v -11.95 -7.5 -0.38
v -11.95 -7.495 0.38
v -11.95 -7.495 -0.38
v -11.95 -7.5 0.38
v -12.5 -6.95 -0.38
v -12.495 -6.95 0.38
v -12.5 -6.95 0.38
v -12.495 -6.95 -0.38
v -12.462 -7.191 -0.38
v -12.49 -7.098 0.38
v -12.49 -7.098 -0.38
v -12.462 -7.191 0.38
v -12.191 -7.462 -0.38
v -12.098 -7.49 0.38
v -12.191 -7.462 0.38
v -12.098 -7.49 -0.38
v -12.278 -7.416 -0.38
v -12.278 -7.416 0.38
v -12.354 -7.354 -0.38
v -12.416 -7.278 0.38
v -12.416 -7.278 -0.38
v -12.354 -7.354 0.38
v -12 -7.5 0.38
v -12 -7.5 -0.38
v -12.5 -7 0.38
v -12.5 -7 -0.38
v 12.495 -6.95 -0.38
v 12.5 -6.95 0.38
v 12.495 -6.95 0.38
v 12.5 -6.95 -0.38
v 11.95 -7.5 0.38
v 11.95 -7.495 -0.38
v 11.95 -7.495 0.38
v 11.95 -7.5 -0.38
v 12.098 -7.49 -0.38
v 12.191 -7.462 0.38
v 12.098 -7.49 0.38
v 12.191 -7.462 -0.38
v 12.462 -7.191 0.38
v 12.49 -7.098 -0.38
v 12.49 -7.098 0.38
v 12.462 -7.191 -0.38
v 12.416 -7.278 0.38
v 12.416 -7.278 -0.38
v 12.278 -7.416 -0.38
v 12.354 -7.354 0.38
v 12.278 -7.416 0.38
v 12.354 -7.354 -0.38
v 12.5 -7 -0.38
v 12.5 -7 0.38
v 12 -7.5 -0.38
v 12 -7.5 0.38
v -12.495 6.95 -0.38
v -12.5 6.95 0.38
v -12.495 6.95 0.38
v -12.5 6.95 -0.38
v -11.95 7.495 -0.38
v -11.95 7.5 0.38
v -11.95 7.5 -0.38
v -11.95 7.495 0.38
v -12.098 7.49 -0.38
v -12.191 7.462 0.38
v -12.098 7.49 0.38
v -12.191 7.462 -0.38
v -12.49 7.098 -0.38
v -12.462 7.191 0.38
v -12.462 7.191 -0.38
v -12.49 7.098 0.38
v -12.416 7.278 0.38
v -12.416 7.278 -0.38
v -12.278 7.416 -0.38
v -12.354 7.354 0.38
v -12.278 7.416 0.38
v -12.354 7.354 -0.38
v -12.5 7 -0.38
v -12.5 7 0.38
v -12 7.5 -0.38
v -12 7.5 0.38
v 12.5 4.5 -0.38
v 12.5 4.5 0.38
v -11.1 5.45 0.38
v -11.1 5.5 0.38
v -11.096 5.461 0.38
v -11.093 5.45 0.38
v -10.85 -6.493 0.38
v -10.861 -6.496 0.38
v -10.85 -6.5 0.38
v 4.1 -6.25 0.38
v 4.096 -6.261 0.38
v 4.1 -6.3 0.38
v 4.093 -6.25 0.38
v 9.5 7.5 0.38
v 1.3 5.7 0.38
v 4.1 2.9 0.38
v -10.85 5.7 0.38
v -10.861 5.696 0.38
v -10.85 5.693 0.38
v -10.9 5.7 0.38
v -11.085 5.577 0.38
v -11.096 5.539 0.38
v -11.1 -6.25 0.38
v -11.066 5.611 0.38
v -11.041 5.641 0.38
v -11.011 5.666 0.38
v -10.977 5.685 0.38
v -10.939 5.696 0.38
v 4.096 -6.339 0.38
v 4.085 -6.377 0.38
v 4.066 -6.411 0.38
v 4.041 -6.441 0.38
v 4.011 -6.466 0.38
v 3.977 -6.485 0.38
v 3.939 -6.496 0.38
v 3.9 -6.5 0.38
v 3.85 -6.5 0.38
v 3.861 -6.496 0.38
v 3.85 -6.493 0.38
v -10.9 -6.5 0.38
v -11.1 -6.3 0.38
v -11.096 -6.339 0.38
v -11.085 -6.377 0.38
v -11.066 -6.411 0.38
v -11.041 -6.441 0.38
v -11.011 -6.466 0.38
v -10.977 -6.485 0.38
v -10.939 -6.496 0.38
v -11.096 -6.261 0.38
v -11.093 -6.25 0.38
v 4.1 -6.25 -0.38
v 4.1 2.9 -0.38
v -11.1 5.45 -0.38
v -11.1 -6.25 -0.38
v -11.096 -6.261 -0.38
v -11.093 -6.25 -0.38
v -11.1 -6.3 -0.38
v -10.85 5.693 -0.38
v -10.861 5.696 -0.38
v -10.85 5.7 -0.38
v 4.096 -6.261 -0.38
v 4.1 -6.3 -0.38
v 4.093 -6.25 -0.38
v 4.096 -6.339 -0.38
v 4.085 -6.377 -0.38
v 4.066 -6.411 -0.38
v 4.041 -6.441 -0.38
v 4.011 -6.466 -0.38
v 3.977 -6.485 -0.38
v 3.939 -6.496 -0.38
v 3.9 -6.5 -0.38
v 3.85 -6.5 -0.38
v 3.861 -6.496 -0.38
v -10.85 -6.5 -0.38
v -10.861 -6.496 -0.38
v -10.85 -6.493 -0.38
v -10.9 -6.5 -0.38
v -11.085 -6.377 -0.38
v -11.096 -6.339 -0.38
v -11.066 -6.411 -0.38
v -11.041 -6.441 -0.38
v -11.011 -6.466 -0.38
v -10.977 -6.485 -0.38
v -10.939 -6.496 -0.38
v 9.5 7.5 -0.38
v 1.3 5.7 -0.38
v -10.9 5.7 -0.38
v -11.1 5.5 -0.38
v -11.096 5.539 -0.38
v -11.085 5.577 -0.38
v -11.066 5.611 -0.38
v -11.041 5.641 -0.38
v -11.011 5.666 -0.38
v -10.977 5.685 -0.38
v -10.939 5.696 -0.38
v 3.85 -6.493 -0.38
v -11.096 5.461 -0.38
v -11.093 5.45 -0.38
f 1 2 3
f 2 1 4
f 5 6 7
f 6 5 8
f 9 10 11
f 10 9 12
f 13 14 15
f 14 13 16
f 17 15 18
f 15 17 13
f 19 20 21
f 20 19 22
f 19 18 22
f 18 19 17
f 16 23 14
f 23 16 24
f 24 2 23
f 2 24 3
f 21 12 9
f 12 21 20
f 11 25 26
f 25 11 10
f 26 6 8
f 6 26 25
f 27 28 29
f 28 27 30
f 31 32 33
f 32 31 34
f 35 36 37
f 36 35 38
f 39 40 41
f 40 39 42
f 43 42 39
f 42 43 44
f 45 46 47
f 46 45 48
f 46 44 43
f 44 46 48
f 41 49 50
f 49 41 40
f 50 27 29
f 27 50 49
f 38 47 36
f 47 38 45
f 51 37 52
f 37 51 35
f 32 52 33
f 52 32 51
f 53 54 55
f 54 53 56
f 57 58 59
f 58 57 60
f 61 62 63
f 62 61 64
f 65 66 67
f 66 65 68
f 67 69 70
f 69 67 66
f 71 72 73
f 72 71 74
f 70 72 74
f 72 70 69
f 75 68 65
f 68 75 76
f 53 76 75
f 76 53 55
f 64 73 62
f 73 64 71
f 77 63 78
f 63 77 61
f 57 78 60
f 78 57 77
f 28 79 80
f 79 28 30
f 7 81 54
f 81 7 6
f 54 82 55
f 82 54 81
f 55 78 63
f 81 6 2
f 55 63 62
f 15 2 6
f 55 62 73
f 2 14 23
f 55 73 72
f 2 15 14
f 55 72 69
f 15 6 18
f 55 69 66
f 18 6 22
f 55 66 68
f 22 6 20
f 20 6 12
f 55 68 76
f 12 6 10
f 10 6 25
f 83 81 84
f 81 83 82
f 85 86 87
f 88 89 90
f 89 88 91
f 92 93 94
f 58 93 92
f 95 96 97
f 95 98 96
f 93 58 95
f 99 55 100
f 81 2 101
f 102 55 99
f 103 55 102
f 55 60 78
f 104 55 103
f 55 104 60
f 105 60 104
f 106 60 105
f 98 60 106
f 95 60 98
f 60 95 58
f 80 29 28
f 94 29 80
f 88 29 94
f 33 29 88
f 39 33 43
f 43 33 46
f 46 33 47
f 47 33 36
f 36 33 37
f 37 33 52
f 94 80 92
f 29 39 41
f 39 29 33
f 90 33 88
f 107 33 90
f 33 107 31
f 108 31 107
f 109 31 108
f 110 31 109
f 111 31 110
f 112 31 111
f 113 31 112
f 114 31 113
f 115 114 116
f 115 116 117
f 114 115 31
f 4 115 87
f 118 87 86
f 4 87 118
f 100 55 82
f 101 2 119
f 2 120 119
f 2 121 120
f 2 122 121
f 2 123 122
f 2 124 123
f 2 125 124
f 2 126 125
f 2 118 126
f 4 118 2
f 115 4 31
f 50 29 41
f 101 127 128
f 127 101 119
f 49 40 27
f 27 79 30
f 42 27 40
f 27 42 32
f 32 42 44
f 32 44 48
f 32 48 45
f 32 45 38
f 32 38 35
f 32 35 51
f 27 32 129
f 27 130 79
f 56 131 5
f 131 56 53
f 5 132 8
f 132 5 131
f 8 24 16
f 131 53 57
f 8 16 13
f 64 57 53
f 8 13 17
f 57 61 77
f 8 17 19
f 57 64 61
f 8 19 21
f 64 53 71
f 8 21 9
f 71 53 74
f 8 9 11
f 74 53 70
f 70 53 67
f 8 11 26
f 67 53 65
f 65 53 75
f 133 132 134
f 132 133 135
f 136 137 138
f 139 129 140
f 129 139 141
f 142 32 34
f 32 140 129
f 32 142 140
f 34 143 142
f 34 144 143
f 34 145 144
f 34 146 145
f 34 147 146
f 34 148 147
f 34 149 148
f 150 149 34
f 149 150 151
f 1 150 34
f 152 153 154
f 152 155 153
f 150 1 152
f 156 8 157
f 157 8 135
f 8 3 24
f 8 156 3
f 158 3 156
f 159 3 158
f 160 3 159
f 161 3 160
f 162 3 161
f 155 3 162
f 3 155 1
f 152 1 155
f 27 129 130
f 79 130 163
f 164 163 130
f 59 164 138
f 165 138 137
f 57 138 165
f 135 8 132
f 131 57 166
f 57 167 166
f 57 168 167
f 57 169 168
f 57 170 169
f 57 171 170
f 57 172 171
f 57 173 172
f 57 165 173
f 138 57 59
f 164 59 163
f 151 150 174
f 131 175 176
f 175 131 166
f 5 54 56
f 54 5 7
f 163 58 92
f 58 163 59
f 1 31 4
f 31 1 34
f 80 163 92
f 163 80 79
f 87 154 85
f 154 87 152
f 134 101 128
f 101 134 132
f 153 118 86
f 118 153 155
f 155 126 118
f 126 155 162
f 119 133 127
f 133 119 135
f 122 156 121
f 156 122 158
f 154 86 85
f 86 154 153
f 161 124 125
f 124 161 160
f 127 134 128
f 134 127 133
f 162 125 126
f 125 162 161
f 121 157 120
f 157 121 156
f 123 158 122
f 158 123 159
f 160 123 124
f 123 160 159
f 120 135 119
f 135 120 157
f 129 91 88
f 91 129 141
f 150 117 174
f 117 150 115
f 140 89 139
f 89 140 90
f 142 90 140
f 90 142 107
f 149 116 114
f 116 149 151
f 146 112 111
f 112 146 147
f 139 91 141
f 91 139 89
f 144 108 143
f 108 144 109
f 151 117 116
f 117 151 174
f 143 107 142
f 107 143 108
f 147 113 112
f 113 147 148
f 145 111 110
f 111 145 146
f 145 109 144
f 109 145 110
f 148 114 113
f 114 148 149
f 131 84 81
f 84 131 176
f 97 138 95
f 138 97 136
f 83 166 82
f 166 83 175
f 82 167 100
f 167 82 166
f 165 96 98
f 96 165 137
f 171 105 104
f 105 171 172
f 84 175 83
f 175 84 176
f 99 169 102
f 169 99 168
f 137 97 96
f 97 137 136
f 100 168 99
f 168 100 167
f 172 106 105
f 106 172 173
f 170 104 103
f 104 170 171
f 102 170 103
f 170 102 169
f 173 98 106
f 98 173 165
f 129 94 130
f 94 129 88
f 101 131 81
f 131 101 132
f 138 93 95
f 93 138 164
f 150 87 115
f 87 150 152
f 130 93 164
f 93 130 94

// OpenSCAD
microsim_adapter();

module microsim_adapter() {
  difference() {
    minisim();
    // adjust hole y-location based on your extrusion width (should not matter too much, contact areas are big enough)
    // adjust microsim hole size larger based on tolerances and hole shrinkage
    translate([-3.5,-0.4,0]) microsim(15.2,12.2,h=.77);
  }
}


/*
difference(){
minisim();
translate([-3.5,-0.4,0]) microsim(h=.77);
//translate([12.5,-7.5,.38]) rotate([-90,0,90]) import_stl("Simkortadapterprtstl_fixed.stl");
}
*/


module roundcut(r=.5,h=3) {
  translate([r/2,r/2,0])
  difference() {
    cube([r+0.1,r+0.1,h],center=true);
    translate([r/2,r/2,0]) cylinder(r=r,h=h,center=true,$fn=32);
  }
}

module cornercut(r=1,h=3,w=3) {
   linear_extrude(height=3,center=true)
     polygon([[-w,0],[0,-w],[0.1,0.1]]);
}


module minisim(l=25,w=15,h=.76) {
  difference(){
    cube([l,w,h],center=true); 
    translate([-l/2,-w/2,0]) roundcut();
    translate([l/2,-w/2,0]) rotate([0,0,90]) roundcut();
    translate([l/2,w/2,0]) rotate([0,0,180]) roundcut();
    translate([-l/2,w/2,0]) rotate([0,0,-90]) roundcut();
    translate([l/2,w/2,0]) cornercut(r=.6);
  }
}

module microsim(l=15,w=12,h=.76) {
  difference(){
    cube([l,w,h],center=true); 
    translate([-l/2,-w/2,0])                            roundcut(r=.2);
    translate([l/2,-w/2,0]) rotate([0,0,90])  roundcut(r=.2);
    translate([l/2,w/2,0]) rotate([0,0,180]) roundcut(r=.2);
    translate([-l/2,w/2,0]) rotate([0,0,-90]) roundcut(r=.2);
    translate([l/2,w/2,0]) cornercut(r=.6,w=2.8);
  }
}
